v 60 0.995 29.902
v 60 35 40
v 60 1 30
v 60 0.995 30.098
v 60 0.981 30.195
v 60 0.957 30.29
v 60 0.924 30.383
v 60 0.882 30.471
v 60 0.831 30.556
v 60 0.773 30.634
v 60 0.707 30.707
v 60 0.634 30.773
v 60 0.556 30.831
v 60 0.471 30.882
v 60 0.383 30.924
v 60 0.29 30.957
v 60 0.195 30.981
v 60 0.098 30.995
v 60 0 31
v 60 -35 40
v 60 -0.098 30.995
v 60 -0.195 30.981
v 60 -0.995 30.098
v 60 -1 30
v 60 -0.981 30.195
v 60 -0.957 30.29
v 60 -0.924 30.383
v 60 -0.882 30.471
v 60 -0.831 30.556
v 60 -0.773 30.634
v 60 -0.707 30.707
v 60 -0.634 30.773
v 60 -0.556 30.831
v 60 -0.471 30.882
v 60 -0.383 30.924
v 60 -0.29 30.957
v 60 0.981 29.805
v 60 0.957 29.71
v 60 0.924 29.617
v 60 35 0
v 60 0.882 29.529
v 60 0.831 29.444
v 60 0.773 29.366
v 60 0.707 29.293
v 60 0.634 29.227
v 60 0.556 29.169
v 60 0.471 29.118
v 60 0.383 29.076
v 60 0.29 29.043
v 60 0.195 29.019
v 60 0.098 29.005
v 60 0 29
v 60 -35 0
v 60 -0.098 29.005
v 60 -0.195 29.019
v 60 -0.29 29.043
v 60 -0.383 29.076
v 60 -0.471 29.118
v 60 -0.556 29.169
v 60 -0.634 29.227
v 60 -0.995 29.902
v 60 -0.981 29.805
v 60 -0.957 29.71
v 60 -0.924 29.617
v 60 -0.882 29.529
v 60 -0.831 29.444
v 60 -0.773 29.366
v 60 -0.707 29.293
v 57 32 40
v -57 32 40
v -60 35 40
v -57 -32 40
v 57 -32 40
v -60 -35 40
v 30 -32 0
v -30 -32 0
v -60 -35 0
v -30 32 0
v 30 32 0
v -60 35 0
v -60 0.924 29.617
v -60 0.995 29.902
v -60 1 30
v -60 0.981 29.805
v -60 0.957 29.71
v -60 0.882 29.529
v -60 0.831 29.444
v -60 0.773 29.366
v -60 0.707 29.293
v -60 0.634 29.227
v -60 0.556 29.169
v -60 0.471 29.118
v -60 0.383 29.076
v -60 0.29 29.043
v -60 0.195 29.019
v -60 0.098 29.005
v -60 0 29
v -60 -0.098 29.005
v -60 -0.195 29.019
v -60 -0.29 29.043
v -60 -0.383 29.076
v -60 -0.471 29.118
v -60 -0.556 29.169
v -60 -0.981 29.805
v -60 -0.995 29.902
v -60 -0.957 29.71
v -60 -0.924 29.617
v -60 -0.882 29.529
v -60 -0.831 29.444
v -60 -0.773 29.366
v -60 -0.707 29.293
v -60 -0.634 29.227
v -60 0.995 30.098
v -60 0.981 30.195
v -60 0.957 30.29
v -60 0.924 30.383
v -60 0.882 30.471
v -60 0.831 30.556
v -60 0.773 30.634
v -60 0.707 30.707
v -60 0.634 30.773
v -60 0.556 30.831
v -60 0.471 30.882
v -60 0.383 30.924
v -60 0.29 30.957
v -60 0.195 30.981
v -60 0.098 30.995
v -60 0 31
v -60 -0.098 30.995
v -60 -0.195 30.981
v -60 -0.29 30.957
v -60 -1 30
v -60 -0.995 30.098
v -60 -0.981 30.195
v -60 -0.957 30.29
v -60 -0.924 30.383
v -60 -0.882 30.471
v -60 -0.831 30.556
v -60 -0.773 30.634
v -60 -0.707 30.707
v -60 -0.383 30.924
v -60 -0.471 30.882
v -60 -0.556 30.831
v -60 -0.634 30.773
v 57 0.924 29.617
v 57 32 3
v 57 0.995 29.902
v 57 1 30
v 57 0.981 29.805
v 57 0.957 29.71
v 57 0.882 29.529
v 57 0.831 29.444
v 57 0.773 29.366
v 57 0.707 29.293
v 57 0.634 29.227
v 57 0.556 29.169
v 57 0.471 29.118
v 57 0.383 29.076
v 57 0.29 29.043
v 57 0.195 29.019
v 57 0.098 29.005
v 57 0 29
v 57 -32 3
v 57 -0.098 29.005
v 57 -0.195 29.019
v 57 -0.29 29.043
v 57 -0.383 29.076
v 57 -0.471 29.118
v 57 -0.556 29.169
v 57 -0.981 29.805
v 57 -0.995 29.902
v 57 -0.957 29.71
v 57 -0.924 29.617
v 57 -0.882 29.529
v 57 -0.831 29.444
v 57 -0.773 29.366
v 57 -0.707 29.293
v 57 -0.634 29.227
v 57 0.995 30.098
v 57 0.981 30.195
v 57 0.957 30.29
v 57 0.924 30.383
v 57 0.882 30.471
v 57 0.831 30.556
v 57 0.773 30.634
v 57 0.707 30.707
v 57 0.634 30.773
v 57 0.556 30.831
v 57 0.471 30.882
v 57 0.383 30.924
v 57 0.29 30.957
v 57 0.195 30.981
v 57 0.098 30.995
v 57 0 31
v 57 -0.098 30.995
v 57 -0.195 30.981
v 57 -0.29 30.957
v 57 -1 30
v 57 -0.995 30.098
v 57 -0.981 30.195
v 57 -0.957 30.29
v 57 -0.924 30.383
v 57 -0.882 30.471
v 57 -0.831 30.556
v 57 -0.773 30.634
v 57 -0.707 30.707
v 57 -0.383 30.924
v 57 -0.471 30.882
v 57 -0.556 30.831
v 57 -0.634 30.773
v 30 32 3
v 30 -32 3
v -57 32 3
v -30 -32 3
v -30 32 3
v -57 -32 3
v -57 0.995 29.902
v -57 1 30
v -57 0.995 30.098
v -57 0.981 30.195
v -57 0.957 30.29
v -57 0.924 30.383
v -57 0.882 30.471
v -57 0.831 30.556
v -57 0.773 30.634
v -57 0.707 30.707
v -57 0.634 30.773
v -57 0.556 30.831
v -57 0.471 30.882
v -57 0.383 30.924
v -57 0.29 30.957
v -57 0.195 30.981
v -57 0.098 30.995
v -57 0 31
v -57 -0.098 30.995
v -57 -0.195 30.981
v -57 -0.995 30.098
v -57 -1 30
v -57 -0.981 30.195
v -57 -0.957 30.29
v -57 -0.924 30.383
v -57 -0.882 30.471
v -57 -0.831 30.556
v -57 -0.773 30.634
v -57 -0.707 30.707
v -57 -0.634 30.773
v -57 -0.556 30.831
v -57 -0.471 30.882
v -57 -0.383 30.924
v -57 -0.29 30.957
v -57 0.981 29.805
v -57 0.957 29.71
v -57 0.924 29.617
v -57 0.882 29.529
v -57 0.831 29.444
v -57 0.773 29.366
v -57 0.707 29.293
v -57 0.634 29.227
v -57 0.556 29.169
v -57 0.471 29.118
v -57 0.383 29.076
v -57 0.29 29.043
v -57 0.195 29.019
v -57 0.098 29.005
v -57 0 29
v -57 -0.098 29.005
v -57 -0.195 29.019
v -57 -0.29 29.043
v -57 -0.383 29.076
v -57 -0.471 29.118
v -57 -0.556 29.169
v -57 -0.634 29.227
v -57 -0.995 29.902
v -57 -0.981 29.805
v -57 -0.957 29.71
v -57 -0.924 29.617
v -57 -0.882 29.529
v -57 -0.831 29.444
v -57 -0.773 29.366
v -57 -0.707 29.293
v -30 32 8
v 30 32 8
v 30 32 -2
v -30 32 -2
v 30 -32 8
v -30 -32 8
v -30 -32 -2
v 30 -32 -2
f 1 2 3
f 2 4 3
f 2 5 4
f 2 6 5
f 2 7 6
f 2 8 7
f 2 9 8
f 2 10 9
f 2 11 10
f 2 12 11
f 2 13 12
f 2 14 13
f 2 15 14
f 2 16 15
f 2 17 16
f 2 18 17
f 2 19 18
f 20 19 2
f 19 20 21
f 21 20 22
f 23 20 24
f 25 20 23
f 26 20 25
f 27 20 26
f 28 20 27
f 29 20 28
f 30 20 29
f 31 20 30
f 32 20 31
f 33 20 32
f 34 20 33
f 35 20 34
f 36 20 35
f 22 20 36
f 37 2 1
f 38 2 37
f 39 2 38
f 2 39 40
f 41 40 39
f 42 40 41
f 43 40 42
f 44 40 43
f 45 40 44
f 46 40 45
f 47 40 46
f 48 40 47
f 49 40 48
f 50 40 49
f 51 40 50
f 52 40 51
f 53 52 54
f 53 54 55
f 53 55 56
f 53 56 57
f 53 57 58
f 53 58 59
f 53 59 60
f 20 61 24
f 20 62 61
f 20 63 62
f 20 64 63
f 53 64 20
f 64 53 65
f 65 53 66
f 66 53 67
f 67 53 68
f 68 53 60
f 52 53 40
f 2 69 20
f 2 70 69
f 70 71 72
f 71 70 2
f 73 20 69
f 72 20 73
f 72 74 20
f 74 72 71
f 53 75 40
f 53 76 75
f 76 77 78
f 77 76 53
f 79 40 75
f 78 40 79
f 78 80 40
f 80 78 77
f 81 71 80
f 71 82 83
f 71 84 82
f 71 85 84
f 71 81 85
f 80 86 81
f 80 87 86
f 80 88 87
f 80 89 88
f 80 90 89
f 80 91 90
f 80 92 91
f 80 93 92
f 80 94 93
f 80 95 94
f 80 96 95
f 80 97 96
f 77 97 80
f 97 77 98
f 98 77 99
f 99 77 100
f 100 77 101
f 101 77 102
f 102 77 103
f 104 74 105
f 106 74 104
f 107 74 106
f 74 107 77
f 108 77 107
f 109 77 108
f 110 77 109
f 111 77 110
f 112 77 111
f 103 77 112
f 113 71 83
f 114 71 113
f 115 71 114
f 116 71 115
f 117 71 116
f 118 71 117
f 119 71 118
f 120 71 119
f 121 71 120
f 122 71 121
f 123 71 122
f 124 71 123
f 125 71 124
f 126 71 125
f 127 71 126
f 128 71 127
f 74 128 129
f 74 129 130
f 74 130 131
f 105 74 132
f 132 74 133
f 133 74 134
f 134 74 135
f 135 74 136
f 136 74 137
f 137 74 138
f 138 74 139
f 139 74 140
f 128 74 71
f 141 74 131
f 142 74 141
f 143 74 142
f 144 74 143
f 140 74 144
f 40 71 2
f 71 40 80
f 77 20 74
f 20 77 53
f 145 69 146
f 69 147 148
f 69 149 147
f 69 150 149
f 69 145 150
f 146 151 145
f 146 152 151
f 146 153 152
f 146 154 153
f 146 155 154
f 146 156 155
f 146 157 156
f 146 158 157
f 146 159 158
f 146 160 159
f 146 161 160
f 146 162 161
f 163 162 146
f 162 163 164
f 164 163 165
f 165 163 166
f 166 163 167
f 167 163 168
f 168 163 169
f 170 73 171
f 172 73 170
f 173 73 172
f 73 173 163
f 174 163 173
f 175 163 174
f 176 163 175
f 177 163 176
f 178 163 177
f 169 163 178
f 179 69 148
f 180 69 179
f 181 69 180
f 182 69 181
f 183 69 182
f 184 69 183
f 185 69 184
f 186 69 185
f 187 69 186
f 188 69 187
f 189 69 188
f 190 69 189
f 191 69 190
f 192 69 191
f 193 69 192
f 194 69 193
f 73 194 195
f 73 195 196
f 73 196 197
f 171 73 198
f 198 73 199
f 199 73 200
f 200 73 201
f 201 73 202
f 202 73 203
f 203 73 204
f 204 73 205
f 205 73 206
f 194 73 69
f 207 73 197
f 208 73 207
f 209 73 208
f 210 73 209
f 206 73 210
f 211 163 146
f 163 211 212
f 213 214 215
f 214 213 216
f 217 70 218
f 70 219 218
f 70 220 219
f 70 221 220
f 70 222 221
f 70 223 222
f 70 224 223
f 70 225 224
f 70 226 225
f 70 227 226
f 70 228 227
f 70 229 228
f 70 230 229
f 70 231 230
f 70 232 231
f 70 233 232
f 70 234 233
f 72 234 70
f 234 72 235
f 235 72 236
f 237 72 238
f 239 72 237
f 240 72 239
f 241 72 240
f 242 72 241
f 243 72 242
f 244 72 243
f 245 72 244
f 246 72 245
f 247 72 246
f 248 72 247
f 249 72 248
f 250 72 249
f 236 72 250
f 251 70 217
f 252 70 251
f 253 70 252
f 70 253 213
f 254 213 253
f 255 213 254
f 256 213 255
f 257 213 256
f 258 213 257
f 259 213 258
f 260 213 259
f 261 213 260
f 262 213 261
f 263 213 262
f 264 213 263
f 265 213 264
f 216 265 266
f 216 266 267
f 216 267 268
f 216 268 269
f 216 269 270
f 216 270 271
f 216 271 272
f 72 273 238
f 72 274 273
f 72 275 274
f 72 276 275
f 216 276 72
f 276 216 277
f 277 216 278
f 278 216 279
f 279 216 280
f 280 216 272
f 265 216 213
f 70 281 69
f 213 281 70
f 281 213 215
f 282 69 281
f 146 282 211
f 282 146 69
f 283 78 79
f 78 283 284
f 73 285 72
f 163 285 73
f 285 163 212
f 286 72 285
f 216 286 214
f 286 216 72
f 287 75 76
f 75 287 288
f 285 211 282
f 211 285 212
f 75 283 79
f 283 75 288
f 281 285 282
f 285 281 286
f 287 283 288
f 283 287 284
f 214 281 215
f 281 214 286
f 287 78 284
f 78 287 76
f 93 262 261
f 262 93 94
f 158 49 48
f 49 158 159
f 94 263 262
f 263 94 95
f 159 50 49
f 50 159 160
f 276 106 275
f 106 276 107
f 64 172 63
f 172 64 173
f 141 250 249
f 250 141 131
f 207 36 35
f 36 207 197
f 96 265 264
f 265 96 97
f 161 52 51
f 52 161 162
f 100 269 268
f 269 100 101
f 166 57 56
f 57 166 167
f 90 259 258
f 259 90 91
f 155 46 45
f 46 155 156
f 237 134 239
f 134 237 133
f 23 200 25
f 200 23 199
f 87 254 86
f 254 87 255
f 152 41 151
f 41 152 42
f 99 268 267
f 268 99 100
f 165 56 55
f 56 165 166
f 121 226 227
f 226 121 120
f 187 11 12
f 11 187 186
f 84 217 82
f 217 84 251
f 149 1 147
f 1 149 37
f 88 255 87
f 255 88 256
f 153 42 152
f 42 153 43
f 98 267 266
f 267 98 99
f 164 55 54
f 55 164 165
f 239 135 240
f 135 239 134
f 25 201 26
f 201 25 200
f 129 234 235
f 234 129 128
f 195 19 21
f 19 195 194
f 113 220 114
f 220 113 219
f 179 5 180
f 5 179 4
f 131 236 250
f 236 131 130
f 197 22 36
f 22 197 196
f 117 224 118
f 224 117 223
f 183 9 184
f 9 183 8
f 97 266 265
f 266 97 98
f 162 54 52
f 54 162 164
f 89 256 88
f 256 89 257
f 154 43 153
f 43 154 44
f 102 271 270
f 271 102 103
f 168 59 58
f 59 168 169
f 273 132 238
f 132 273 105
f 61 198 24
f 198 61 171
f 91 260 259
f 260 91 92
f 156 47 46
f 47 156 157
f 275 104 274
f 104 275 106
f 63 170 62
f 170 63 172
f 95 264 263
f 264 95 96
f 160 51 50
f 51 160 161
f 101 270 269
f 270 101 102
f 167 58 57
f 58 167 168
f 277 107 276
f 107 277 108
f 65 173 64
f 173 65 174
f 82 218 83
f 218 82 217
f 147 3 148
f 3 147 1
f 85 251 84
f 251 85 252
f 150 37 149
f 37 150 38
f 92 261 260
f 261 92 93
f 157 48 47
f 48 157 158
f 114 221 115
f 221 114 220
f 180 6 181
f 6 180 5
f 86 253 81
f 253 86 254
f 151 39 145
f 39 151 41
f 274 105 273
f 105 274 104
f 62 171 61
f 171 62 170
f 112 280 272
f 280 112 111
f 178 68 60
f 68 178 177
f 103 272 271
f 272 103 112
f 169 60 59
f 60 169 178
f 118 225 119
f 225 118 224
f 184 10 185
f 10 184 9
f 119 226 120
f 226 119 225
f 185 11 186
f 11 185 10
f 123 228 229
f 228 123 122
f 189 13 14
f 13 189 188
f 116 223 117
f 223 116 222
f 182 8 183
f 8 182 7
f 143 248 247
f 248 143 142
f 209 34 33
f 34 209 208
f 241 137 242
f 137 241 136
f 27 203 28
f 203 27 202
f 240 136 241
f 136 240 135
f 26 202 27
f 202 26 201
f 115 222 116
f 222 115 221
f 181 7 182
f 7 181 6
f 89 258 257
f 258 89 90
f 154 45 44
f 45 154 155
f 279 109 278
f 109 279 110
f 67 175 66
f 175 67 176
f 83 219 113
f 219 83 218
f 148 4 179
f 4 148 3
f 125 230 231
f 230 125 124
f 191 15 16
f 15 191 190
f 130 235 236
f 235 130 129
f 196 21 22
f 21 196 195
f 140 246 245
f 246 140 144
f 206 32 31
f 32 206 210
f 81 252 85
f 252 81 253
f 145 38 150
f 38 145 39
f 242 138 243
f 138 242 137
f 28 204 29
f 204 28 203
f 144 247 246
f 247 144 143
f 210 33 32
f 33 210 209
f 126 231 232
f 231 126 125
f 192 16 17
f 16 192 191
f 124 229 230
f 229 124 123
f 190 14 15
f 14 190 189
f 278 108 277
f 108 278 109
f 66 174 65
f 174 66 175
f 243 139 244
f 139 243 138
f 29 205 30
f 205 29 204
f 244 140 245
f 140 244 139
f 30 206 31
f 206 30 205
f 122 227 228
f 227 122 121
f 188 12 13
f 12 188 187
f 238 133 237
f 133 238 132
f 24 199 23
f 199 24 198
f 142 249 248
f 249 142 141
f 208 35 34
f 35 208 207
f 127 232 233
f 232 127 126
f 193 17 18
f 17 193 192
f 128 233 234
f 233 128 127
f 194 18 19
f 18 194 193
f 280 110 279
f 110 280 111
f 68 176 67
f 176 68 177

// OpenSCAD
// Buffer tank for a mini horizontal gel-electrophoresis box
// Print orientation: rests on the XY plane at z = 0 and builds upward (+Z), centred on the origin in X and Y.

// ---- Outer envelope ----
L = 120;   // outer length along X
W = 70;    // outer width  along Y
H = 40;    // outer height along Z

// ---- Wall / floor thickness ----
t = 3;     // uniform wall and floor thickness

// ---- Inner cavity (open top) ----
Li = L - 2*t;   // 114 mm inner length
Wi = W - 2*t;   //  64 mm inner width
Hi = H - t;     //  37 mm inner depth (floor top at z = 3)

// ---- Central gel-tray platform ----
pL = 60;        // platform length along X (centred)
pH = 10;        // platform height above the inner floor (top at z = 13)

// ---- Electrode-wire holes (through both X end walls) ----
d  = 2;         // hole diameter
hy = 0;         // hole centre Y (on the centreline)
hz = 30;        // hole centre Z

$fn = 64;       // round holes

// ---- Base solid: outer box minus inner cavity (open top) ----
module tank() { difference() {
    translate([-L/2, -W/2, 0])
        cube([L, W, H]);
    // cavity extends 1 mm past the top so the top face is fully open
    translate([-Li/2, -Wi/2, t])
        cube([Li, Wi, Hi + 1]);
} }

// ---- Solid raised platform (spans full inner width, centred in X) ----
module platform() { translate([0, 0, t])
    cube([pL, Wi, pH], center = true); }

// ---- Electrode-wire holes: cylinders along X, extended 1 mm past each end wall ----
module wire_holes() { for (sx = [-1, 1])
    translate([sx * (L/2 + 1), hy, hz])
        rotate([0, 90, 0])
            cylinder(h = L + 2, r = d/2, center = true); }

// ---- Final part ----
difference() {
    union() {
        tank();
        platform();
    }
    wire_holes();
}
